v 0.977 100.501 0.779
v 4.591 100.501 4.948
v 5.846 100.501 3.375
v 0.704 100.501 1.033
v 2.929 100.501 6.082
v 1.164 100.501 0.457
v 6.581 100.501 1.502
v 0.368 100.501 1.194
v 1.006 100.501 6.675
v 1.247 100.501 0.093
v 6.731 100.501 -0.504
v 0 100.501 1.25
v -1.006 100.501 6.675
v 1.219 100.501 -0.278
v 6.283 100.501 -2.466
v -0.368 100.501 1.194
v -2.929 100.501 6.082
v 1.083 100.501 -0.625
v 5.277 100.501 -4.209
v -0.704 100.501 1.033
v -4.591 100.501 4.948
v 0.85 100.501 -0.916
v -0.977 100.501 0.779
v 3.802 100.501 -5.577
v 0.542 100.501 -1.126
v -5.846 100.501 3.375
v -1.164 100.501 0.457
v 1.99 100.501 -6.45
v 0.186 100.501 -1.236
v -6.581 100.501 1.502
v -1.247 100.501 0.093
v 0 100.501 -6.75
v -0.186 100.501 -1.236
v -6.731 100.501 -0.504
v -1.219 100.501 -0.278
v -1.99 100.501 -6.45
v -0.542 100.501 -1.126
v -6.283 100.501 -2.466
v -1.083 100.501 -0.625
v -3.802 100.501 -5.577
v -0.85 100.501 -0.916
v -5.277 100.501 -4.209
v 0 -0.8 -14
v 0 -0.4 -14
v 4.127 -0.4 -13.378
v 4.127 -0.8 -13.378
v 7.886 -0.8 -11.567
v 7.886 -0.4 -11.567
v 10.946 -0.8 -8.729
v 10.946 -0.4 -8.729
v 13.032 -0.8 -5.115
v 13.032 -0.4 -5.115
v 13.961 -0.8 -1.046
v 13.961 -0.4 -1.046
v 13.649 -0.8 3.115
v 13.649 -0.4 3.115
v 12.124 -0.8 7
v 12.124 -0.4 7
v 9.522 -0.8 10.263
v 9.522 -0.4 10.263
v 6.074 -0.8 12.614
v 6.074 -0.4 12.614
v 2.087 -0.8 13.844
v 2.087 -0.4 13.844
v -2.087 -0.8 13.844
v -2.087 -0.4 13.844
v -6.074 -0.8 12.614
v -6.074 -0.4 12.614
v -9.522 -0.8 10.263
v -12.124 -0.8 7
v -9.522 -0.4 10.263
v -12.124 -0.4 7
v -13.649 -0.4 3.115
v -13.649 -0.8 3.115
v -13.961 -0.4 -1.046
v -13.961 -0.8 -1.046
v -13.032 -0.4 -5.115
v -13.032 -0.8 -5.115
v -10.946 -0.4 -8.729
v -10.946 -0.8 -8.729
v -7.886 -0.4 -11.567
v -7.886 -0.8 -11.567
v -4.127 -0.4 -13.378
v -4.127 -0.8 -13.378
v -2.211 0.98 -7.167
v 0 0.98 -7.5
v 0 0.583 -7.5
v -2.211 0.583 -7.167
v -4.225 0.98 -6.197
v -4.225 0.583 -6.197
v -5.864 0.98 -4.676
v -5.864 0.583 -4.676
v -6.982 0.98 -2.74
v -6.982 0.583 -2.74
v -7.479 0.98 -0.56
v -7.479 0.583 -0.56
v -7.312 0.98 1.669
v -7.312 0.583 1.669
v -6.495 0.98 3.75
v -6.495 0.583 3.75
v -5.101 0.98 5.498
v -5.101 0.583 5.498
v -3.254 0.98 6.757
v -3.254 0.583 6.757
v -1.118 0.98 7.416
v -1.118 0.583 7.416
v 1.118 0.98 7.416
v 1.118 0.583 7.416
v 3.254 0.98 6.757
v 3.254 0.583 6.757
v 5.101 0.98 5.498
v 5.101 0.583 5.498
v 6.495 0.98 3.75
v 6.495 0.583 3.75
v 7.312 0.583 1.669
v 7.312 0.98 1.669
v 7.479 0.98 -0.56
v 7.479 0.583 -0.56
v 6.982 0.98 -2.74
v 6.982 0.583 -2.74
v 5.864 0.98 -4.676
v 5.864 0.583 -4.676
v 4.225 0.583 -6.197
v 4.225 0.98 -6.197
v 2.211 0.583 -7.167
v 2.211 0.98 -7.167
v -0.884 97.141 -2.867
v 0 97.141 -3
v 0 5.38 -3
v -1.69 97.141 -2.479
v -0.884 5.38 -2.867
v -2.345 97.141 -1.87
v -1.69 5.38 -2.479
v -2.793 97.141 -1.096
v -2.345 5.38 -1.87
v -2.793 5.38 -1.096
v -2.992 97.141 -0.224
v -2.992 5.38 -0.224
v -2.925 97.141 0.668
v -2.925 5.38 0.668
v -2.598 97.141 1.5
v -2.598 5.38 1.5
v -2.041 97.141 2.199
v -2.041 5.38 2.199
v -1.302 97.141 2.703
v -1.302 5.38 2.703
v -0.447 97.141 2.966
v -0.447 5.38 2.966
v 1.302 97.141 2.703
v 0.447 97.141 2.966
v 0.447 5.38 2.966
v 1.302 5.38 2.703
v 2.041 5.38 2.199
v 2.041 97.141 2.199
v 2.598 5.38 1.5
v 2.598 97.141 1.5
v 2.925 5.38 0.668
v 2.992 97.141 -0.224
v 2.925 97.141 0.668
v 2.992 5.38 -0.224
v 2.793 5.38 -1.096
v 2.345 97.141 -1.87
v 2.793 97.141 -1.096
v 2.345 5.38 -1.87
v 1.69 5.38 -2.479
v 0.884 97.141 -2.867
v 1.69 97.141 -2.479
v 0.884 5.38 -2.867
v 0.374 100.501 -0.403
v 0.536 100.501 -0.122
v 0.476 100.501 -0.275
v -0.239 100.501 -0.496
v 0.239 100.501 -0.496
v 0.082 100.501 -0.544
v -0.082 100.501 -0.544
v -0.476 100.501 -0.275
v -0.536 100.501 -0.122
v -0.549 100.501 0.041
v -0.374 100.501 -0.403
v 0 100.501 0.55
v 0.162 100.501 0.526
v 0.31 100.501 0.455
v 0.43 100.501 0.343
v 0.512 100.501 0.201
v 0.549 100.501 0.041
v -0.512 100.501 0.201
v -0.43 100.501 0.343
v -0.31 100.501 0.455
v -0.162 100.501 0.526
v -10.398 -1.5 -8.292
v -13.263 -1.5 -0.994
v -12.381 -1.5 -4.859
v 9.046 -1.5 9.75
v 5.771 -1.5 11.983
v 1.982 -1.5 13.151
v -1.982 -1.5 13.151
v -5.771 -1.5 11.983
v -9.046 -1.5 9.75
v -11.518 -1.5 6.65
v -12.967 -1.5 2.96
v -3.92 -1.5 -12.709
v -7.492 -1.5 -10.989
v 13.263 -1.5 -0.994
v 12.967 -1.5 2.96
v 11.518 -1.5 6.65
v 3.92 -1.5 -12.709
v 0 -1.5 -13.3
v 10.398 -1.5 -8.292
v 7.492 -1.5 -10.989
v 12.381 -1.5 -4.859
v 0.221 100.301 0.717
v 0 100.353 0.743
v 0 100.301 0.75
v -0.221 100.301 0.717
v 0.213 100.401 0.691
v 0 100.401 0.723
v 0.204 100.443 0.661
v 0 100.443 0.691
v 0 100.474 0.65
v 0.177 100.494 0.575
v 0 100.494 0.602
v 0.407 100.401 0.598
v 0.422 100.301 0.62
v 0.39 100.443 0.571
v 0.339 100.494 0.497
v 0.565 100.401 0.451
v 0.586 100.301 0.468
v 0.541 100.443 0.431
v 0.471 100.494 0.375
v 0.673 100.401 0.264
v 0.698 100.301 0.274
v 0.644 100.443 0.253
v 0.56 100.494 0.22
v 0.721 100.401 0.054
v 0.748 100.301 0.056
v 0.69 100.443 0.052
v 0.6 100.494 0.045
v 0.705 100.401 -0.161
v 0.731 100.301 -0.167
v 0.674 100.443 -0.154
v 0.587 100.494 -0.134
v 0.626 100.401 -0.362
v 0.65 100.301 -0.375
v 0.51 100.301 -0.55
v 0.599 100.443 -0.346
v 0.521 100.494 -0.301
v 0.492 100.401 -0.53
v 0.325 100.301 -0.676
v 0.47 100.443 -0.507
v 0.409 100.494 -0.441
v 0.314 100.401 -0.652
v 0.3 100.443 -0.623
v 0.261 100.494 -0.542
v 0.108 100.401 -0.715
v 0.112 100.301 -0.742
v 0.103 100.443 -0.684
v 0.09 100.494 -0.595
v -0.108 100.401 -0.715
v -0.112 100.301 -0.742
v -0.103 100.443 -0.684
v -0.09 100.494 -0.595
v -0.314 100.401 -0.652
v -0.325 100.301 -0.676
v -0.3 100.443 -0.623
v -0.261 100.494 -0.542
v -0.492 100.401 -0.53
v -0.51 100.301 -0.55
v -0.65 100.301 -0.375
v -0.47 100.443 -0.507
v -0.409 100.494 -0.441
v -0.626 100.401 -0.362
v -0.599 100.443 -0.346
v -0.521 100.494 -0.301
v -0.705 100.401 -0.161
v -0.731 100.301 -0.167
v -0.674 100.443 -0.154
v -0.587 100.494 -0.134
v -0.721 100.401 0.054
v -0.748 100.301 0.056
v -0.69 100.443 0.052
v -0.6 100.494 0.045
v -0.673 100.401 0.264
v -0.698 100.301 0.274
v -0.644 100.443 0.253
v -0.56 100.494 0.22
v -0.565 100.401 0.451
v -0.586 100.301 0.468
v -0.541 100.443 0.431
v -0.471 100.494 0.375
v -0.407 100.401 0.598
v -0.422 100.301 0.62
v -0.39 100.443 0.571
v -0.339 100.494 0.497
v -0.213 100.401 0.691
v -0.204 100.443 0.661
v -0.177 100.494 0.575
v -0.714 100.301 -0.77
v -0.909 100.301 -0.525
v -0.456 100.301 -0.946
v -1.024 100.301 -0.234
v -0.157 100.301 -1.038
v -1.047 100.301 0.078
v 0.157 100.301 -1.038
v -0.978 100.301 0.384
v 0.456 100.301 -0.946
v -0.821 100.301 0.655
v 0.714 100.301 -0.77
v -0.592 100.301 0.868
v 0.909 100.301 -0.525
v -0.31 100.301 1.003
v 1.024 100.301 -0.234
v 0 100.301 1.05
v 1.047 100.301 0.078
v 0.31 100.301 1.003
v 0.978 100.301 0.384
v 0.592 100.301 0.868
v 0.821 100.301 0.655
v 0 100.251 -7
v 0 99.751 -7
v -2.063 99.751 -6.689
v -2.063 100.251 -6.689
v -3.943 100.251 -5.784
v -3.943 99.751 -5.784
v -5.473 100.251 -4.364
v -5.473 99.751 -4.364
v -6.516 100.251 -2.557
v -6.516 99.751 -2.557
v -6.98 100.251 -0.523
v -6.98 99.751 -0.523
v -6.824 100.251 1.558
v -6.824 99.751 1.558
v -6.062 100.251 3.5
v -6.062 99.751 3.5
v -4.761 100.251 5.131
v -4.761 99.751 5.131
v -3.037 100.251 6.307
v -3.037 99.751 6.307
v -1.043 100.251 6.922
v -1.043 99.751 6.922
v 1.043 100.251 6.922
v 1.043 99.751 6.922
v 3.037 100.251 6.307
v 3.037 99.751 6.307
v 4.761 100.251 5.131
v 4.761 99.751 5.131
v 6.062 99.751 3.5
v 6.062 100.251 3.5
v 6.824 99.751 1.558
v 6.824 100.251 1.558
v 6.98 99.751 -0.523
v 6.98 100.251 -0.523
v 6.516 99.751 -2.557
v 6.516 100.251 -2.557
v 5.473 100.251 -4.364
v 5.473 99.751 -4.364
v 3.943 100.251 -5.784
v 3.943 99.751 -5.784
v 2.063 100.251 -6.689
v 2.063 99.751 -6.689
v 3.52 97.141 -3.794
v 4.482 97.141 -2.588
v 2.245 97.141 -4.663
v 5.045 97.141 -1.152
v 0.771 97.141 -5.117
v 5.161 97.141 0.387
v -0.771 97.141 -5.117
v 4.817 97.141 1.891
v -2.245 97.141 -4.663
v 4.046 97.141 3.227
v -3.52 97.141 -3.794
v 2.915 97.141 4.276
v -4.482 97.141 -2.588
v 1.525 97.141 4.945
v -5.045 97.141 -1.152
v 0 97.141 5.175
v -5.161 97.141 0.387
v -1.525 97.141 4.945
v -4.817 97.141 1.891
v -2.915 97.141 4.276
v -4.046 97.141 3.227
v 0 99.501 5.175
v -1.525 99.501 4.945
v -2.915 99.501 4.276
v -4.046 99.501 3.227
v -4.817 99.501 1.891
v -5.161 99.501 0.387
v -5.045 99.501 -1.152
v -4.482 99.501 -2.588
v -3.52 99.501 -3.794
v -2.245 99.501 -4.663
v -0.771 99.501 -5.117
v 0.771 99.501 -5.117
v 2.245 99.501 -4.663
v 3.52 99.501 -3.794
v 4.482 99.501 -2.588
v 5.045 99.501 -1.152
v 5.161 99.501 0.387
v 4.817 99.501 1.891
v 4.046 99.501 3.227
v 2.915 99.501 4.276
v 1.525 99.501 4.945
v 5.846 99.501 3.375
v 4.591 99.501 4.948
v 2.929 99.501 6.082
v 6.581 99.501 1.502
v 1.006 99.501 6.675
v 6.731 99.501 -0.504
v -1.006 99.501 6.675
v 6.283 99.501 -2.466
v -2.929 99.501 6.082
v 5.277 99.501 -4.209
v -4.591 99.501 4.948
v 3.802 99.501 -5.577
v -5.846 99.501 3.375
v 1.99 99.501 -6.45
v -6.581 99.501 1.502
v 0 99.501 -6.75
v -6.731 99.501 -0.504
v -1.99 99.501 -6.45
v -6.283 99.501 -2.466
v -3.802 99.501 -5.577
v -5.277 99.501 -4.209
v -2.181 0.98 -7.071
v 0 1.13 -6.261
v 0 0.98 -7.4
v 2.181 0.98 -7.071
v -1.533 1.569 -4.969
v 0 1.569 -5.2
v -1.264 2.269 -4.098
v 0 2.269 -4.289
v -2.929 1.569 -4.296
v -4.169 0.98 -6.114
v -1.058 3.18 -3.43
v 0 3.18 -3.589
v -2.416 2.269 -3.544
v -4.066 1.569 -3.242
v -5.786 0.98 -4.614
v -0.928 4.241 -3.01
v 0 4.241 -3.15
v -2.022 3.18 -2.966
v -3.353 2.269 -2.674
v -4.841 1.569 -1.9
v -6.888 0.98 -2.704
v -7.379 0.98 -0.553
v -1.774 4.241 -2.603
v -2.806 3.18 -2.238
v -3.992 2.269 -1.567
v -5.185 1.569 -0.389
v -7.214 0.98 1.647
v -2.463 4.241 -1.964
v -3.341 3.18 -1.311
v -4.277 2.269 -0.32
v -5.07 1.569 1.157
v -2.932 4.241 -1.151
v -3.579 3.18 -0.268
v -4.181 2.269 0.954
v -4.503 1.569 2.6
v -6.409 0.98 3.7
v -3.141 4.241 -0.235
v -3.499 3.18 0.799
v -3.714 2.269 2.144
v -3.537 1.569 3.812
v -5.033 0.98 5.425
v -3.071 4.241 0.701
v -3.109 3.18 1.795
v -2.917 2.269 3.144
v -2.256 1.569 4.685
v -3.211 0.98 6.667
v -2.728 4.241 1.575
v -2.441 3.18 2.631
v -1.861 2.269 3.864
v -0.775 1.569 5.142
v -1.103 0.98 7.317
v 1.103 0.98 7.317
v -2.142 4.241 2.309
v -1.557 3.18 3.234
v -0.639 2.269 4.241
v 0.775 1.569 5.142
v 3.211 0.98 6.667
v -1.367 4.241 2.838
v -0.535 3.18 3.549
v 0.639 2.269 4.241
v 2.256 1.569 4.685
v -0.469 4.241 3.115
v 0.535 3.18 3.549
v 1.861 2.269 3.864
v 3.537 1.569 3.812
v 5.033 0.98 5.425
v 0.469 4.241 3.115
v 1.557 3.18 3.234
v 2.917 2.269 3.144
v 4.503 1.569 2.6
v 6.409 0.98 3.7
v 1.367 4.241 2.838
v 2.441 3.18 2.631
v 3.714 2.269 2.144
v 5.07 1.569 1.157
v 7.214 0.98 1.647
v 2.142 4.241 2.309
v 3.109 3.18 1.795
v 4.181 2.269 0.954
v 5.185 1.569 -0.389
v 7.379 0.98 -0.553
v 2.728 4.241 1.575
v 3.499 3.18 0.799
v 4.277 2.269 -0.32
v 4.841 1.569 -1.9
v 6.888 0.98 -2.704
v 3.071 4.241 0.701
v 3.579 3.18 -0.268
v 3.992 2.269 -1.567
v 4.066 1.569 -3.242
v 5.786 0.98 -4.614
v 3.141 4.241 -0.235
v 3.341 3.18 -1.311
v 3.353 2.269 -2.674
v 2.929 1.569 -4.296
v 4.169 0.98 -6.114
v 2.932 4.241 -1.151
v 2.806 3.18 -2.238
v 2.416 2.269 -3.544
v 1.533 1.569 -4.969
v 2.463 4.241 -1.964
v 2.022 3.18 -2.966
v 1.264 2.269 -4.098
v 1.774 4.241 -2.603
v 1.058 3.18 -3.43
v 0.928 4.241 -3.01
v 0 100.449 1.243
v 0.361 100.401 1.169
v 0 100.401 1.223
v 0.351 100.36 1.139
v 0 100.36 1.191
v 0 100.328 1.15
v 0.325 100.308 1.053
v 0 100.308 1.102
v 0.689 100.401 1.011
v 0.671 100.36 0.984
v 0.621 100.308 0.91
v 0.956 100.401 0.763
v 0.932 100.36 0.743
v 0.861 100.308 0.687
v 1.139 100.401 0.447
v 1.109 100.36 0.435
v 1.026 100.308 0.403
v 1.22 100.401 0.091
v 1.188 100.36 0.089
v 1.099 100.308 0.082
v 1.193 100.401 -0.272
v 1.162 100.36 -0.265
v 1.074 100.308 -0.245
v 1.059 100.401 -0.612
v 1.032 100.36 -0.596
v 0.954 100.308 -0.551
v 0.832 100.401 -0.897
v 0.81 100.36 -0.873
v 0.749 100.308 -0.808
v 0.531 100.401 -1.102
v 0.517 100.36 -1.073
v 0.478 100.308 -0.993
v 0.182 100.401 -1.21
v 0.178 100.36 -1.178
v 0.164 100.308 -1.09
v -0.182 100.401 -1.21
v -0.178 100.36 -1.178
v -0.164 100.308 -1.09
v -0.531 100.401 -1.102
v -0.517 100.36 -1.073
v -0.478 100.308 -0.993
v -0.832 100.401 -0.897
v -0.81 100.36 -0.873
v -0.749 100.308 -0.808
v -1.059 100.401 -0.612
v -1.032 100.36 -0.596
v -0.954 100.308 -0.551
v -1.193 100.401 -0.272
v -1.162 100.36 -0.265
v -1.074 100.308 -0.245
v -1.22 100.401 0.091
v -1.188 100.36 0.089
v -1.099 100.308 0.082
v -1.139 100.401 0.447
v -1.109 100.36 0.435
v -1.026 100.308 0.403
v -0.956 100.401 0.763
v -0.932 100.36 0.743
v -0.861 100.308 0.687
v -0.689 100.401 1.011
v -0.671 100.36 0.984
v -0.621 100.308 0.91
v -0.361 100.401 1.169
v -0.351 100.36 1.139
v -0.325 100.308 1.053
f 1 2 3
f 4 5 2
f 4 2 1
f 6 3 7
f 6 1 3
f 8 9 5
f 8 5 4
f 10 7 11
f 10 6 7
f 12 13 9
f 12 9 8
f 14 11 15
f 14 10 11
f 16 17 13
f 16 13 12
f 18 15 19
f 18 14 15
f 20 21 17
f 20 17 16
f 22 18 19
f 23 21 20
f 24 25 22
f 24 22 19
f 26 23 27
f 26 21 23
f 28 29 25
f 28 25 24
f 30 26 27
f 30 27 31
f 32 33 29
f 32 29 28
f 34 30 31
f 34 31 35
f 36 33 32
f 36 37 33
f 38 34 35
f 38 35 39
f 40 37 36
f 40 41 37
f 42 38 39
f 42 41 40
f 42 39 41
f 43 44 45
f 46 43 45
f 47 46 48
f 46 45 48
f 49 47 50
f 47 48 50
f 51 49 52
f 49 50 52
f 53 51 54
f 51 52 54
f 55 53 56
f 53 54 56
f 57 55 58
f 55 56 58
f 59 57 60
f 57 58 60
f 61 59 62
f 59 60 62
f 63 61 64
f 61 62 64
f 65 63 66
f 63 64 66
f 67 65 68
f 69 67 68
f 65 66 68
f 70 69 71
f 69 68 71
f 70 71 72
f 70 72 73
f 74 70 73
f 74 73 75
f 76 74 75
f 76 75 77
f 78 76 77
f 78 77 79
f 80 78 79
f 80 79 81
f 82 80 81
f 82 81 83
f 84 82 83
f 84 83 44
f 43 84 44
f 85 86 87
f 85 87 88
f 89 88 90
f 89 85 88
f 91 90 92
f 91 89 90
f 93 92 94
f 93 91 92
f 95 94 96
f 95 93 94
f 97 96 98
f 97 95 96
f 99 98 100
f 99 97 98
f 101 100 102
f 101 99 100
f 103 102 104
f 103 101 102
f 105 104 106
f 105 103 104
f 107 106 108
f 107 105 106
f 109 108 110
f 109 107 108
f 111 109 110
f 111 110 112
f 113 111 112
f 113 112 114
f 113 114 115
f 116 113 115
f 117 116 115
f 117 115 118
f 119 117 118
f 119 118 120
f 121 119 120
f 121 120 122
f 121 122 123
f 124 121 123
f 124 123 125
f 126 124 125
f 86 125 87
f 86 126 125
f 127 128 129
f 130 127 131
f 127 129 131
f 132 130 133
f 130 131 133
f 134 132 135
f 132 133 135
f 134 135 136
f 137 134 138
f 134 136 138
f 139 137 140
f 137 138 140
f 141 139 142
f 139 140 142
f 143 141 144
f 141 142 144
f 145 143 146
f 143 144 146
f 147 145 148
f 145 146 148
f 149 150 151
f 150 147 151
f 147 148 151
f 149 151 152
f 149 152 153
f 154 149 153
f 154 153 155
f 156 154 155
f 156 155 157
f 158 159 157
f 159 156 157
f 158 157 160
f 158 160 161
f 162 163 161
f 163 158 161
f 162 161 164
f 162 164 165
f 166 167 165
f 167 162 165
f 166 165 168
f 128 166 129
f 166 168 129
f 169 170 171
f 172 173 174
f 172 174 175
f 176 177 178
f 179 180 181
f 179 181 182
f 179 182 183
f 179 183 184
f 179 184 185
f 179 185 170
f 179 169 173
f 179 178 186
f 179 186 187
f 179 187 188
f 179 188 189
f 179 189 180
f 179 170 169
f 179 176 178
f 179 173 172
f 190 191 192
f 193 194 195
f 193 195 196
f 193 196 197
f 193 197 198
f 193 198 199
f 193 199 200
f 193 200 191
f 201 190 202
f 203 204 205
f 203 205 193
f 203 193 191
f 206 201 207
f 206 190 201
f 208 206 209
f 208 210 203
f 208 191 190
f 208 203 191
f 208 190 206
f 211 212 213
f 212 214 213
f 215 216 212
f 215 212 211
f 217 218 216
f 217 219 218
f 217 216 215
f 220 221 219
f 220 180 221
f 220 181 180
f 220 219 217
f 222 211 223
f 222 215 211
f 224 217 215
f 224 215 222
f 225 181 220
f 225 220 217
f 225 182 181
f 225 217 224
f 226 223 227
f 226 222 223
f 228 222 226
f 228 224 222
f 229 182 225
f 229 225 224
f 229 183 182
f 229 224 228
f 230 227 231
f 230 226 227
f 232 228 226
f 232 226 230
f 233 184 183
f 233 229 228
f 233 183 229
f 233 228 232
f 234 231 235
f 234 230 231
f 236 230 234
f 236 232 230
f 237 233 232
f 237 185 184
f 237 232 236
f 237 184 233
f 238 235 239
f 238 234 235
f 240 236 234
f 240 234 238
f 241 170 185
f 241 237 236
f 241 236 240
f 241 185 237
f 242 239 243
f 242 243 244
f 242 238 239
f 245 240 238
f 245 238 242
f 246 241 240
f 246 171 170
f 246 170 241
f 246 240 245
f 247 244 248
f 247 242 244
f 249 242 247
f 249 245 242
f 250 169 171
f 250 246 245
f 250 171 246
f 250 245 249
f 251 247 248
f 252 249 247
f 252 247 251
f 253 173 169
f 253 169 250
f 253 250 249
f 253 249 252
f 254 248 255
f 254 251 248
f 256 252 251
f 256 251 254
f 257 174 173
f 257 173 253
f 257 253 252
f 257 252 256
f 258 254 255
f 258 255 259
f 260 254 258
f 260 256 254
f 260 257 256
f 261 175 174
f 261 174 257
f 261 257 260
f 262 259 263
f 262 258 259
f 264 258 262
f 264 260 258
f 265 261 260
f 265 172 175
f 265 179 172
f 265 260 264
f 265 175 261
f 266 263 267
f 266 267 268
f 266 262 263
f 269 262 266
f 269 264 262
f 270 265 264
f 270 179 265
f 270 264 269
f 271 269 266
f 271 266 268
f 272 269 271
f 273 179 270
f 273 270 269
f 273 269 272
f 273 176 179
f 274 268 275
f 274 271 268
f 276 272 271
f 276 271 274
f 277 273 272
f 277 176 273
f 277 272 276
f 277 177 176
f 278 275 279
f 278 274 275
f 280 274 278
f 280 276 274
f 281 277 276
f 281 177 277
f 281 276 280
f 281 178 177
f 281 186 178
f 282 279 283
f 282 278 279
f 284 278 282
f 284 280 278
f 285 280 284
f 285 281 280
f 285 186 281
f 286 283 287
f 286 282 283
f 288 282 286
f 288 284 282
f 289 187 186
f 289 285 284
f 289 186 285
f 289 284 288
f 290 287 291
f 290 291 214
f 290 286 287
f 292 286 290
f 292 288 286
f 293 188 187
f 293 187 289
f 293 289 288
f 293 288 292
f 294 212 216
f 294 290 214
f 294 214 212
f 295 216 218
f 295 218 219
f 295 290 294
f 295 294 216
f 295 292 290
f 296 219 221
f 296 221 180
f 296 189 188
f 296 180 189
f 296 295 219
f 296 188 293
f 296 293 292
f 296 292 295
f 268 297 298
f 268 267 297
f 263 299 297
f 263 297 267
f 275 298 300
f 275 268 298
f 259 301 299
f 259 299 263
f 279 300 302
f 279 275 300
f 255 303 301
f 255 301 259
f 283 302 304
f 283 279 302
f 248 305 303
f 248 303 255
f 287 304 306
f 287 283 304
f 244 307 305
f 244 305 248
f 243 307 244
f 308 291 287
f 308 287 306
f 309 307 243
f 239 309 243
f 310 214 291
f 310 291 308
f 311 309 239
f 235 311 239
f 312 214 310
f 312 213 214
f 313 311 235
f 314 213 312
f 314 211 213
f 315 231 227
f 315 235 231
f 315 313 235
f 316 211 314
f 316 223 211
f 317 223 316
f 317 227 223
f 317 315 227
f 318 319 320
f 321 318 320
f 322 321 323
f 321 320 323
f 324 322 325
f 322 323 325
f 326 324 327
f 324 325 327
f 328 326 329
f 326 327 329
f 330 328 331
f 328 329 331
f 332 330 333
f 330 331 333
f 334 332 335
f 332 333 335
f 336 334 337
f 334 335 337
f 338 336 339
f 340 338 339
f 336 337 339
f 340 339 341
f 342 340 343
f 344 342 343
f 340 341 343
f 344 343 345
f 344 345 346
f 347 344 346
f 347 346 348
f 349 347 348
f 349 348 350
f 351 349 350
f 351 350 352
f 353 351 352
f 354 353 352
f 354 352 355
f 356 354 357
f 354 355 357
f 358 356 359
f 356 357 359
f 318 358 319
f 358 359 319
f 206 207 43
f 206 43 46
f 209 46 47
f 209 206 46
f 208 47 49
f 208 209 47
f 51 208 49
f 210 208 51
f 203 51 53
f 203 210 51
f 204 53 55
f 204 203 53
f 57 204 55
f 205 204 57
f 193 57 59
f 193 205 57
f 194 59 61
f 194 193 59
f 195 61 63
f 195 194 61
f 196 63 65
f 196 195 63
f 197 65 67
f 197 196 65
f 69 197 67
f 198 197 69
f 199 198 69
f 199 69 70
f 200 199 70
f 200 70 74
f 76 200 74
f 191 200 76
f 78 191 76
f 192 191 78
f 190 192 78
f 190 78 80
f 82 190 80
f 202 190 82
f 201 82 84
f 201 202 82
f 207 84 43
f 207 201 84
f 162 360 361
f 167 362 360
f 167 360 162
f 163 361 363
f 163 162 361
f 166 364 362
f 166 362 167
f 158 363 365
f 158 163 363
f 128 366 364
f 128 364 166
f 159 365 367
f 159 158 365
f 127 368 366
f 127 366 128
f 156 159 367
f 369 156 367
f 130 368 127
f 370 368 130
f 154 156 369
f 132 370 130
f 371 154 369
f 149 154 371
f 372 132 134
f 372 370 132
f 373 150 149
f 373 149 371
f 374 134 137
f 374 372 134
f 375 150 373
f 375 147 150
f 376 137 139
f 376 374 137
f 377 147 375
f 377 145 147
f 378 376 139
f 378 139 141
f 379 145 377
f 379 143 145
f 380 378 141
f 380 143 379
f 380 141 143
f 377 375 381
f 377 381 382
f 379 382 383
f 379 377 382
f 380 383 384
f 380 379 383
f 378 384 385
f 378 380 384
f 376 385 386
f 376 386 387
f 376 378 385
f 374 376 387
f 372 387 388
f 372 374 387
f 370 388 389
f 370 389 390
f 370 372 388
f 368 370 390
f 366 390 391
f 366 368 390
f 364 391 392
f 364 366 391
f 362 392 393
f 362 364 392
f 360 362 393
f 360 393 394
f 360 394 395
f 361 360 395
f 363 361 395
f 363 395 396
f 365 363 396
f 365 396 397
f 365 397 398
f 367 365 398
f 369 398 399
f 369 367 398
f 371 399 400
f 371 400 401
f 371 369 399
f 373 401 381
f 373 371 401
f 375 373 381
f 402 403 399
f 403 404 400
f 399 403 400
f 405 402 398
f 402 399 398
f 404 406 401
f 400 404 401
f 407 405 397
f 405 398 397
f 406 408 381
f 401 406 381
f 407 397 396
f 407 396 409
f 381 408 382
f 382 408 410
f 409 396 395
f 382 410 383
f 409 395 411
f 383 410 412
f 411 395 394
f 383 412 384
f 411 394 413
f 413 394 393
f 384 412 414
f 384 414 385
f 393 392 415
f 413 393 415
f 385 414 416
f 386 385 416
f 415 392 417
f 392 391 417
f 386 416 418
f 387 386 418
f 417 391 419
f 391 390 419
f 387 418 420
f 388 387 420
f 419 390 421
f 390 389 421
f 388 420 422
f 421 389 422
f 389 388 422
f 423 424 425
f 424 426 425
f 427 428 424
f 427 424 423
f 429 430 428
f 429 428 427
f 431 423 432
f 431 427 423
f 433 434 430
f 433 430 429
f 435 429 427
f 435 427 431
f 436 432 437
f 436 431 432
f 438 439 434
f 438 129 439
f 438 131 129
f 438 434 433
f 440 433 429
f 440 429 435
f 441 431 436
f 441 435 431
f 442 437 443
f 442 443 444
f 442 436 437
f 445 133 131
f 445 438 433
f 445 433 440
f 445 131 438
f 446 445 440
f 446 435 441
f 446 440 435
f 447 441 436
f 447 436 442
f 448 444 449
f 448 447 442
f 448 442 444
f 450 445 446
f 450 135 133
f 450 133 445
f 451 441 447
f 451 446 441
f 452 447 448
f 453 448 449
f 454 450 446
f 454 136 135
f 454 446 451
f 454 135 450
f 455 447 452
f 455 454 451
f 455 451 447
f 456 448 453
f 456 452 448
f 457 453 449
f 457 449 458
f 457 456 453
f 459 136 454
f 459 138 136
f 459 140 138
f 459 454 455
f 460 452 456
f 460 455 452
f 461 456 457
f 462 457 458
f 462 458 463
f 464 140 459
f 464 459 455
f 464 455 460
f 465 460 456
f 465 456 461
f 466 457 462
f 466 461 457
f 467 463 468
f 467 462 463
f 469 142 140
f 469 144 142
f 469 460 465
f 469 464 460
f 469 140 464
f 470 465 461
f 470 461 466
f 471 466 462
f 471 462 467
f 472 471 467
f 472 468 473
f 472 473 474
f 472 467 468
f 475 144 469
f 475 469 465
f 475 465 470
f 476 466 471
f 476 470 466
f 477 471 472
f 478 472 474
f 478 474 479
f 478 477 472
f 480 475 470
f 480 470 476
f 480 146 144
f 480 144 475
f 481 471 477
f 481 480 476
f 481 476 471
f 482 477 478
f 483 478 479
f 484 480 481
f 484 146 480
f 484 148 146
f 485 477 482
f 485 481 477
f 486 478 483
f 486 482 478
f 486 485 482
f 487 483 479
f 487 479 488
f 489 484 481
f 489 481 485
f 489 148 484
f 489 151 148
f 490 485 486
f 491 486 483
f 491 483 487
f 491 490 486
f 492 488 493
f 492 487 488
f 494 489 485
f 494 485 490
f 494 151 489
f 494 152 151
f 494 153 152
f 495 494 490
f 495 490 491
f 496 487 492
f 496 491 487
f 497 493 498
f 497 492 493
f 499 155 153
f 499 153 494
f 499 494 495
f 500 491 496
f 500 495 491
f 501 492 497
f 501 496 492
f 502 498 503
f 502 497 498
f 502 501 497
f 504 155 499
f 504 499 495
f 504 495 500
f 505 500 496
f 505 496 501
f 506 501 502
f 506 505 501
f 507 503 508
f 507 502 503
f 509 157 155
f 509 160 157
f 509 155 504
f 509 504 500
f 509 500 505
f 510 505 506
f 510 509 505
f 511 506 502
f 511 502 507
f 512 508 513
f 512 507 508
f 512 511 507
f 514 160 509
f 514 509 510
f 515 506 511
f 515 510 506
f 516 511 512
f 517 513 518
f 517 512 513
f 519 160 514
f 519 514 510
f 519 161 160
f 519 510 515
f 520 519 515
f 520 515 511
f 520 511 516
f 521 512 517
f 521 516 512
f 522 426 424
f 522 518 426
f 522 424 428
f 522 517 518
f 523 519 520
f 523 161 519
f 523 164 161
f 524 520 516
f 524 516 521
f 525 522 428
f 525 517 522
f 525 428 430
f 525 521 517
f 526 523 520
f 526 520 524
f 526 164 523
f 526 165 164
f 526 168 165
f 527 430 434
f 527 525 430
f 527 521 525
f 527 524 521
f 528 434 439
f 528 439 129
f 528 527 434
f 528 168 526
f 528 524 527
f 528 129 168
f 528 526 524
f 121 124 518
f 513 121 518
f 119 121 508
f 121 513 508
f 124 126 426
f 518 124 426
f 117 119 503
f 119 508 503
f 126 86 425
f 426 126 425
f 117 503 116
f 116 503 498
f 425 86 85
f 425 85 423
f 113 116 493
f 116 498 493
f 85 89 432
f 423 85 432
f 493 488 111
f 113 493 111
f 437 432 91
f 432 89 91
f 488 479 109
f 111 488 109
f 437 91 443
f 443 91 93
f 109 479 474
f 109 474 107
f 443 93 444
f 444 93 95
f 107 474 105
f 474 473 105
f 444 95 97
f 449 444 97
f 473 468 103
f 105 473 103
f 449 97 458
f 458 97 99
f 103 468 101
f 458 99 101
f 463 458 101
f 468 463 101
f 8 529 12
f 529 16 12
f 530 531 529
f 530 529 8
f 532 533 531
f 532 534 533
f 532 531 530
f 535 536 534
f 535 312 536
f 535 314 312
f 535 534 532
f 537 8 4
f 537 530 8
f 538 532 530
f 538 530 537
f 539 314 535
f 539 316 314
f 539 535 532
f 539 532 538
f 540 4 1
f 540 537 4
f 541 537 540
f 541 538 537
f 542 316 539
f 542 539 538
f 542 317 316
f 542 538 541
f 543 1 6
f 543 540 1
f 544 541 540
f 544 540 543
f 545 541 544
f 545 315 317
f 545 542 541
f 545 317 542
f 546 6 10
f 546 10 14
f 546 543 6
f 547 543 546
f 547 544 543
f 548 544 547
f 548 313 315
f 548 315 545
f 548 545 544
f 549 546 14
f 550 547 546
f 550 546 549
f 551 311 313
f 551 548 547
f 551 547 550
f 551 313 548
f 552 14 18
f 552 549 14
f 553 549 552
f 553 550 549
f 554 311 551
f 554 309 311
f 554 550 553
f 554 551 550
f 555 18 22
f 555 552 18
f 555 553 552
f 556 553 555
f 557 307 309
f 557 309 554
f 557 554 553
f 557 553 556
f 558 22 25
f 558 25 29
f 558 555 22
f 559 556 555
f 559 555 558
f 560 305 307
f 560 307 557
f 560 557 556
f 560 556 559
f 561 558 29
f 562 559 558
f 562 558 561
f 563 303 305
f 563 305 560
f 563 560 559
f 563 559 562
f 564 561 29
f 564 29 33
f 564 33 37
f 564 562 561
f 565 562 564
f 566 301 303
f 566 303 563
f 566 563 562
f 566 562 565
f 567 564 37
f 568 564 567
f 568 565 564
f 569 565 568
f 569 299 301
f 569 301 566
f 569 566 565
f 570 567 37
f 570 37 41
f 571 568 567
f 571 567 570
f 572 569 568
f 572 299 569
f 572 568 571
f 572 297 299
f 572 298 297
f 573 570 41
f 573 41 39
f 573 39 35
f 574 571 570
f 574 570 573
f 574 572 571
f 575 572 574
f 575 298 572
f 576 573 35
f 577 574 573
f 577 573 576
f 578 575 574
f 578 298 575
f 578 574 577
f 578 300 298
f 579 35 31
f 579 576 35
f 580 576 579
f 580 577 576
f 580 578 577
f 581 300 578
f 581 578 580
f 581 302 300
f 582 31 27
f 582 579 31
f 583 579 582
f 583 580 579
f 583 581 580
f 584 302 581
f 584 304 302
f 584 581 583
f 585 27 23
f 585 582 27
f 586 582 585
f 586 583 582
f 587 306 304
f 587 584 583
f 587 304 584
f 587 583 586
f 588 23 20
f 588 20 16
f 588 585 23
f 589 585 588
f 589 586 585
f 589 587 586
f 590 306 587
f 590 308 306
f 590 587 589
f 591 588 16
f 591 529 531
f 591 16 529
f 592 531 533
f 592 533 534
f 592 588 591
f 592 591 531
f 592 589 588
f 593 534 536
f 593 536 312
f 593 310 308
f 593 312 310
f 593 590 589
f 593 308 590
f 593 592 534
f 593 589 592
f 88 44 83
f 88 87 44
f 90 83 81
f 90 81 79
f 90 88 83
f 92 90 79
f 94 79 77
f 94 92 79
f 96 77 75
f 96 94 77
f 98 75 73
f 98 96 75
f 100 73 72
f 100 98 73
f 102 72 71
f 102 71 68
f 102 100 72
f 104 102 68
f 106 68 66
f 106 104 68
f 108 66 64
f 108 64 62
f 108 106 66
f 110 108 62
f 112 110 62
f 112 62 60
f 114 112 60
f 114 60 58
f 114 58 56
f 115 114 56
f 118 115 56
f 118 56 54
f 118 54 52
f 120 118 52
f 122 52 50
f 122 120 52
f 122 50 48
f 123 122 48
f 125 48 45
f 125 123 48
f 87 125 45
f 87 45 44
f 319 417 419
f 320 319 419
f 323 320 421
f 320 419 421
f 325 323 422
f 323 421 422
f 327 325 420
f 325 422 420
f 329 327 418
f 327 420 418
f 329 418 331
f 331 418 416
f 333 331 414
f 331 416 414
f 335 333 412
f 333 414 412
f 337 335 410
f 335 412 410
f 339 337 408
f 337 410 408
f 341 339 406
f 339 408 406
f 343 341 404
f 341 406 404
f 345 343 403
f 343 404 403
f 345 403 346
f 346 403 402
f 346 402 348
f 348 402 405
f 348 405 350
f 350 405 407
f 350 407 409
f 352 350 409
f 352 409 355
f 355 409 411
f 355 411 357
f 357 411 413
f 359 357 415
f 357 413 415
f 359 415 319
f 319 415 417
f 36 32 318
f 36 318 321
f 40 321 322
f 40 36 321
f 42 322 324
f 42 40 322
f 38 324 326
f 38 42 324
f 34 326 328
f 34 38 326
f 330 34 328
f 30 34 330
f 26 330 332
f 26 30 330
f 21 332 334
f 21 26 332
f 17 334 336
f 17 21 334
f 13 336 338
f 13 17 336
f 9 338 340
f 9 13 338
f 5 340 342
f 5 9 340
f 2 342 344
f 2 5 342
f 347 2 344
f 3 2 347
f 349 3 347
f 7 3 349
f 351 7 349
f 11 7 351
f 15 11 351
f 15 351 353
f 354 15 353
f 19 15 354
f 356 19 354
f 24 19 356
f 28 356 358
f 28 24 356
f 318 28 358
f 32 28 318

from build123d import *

# Parameters (mm, degrees)
CROQUIS2_R              = 3
SALIENTE_EXTRUIR1_DEPTH = 17.61
CROQUIS3_R              = 7
CROQUIS3_R_2            = 3
SALIENTE_EXTRUIR2_DEPTH = 1
CHAFL_N1_SIZE           = 0.25
CROQUIS4_R              = 14
SALIENTE_EXTRUIR3_DEPTH = 1.5
CHAFL_N2_SIZE           = 0.7
REDONDEO3_R             = 4.4
CROQUIS6_R              = 1.25
CROQUIS6_R_2            = 0.75
CORTAR_EXTRUIR1_DEPTH   = 0.2
REDONDEO4_R             = 0.2
REDONDEO5_R             = 0.2
SALIENTE_EXTRUIR4_START = 2.36
CROQUIS7_R              = 5.175
CROQUIS7_R_2            = 3
SALIENTE_EXTRUIR4_DEPTH = 2.36


with BuildPart() as part:
    # Croquis1 → Revolución1 (revolve)
    with BuildSketch(Plane.XY, mode=Mode.PRIVATE) as revoluci_n1_sk:
        Polygon((-3, 0.98), (-7.5, 0.98), (-14, 0), (0, 0), (0, 82.891267921), (-3, 82.891267921), align=None)
    revolve(revoluci_n1_sk.sketch.rotate(Axis((0, 0, 0), (0, 1, 0)), 270), axis=Axis((0, 0, 0), (0, 1, 0)))

    # Croquis2 → Saliente-Extruir1 (add)
    with BuildSketch(Plane(origin=(0, 82.891267921, 0), x_dir=(1, 0, 0), z_dir=(0, 1, 0))):
        with Locations(Location((0, 0, 0), (0, 0, 90))):
            Circle(CROQUIS2_R)
    extrude(amount=SALIENTE_EXTRUIR1_DEPTH)

    # Croquis3 → Saliente-Extruir2 (add)
    with BuildSketch(Plane(origin=(0, 99.501267921, 0), x_dir=(1, 0, 0), z_dir=(0, 1, 0))):
        with Locations(Location((0, 0, 0), (0, 0, 90))):
            Circle(CROQUIS3_R)
        with Locations(Location((0, 0, 0), (0, 0, 90))):
            Circle(CROQUIS3_R_2, mode=Mode.SUBTRACT)
    extrude(amount=SALIENTE_EXTRUIR2_DEPTH)

    # Chaflán1
    chafl_n1_edges = [part.edges().sort_by_distance(p)[0] for p in [
        (0, 99.501267921, 7),
        (0, 100.501267921, 7),
    ]]
    chamfer(chafl_n1_edges, length=CHAFL_N1_SIZE)

    # Croquis4 → Saliente-Extruir3 (add)
    with BuildSketch(Plane.XZ):
        with Locations(Location((0, 0, 0), (0, 0, 270))):
            Circle(CROQUIS4_R)
    extrude(amount=SALIENTE_EXTRUIR3_DEPTH)

    # Chaflán2
    chafl_n2_edges = [part.edges().sort_by_distance(p)[0] for p in [
        (0, -1.5, 14),
    ]]
    chamfer(chafl_n2_edges, length=CHAFL_N2_SIZE)

    # Redondeo3
    redondeo3_edges = [part.edges().sort_by_distance(p)[0] for p in [
        (0, 0.98, 3),
    ]]
    fillet(redondeo3_edges, radius=REDONDEO3_R)

    # Croquis5 → Cortar-Revolución1 (revolve, cut)
    with BuildSketch(Plane(origin=(0, 0, 0), x_dir=(0, 0, -1), z_dir=(1, 0, 0)), mode=Mode.PRIVATE) as cortar_revoluci_n1_sk:
        Polygon((-7.5, 0.98), (-14, 0), (-14, -0.4), (-7.5, 0.58264143), align=None)
    revolve(cortar_revoluci_n1_sk.sketch.rotate(Axis((0, 0, 0), (0, 1, 0)), 180), axis=Axis((0, 0, 0), (0, 1, 0)), mode=Mode.SUBTRACT)

    # Croquis6 → Cortar-Extruir1 (cut)
    with BuildSketch(Plane(origin=(0, 100.501267921, 0), x_dir=(1, 0, 0), z_dir=(0, 1, 0))):
        with Locations(Location((0, 0, 0), (0, 0, 270))):
            Circle(CROQUIS6_R)
        with Locations(Location((0, 0, 0), (0, 0, 270))):
            Circle(CROQUIS6_R_2, mode=Mode.SUBTRACT)
    extrude(amount=-CORTAR_EXTRUIR1_DEPTH, mode=Mode.SUBTRACT)

    # Redondeo4
    redondeo4_edges = [part.edges().sort_by_distance(p)[0] for p in [
        (0, 100.301267921, -1.25),
    ]]
    fillet(redondeo4_edges, radius=REDONDEO4_R - 0.0001)  # a hair under: the kernel refuses the full size

    # Redondeo5
    redondeo5_edges = [part.edges().sort_by_distance(p)[0] for p in [
        (0, 100.501267921, -0.75),
    ]]
    fillet(redondeo5_edges, radius=REDONDEO5_R - 0.0001)  # a hair under: the kernel refuses the full size

    # Croquis7 → Saliente-Extruir4 (add)
    with BuildSketch(Plane.XZ.offset(-99.501267921).offset(SALIENTE_EXTRUIR4_START)):
        with Locations(Location((0, 0, 0), (0, 0, 90))):
            Circle(CROQUIS7_R)
        with Locations(Location((0, 0, 0), (0, 0, 270))):
            Circle(CROQUIS7_R_2, mode=Mode.SUBTRACT)
    extrude(amount=-SALIENTE_EXTRUIR4_DEPTH)


solid = part.part
